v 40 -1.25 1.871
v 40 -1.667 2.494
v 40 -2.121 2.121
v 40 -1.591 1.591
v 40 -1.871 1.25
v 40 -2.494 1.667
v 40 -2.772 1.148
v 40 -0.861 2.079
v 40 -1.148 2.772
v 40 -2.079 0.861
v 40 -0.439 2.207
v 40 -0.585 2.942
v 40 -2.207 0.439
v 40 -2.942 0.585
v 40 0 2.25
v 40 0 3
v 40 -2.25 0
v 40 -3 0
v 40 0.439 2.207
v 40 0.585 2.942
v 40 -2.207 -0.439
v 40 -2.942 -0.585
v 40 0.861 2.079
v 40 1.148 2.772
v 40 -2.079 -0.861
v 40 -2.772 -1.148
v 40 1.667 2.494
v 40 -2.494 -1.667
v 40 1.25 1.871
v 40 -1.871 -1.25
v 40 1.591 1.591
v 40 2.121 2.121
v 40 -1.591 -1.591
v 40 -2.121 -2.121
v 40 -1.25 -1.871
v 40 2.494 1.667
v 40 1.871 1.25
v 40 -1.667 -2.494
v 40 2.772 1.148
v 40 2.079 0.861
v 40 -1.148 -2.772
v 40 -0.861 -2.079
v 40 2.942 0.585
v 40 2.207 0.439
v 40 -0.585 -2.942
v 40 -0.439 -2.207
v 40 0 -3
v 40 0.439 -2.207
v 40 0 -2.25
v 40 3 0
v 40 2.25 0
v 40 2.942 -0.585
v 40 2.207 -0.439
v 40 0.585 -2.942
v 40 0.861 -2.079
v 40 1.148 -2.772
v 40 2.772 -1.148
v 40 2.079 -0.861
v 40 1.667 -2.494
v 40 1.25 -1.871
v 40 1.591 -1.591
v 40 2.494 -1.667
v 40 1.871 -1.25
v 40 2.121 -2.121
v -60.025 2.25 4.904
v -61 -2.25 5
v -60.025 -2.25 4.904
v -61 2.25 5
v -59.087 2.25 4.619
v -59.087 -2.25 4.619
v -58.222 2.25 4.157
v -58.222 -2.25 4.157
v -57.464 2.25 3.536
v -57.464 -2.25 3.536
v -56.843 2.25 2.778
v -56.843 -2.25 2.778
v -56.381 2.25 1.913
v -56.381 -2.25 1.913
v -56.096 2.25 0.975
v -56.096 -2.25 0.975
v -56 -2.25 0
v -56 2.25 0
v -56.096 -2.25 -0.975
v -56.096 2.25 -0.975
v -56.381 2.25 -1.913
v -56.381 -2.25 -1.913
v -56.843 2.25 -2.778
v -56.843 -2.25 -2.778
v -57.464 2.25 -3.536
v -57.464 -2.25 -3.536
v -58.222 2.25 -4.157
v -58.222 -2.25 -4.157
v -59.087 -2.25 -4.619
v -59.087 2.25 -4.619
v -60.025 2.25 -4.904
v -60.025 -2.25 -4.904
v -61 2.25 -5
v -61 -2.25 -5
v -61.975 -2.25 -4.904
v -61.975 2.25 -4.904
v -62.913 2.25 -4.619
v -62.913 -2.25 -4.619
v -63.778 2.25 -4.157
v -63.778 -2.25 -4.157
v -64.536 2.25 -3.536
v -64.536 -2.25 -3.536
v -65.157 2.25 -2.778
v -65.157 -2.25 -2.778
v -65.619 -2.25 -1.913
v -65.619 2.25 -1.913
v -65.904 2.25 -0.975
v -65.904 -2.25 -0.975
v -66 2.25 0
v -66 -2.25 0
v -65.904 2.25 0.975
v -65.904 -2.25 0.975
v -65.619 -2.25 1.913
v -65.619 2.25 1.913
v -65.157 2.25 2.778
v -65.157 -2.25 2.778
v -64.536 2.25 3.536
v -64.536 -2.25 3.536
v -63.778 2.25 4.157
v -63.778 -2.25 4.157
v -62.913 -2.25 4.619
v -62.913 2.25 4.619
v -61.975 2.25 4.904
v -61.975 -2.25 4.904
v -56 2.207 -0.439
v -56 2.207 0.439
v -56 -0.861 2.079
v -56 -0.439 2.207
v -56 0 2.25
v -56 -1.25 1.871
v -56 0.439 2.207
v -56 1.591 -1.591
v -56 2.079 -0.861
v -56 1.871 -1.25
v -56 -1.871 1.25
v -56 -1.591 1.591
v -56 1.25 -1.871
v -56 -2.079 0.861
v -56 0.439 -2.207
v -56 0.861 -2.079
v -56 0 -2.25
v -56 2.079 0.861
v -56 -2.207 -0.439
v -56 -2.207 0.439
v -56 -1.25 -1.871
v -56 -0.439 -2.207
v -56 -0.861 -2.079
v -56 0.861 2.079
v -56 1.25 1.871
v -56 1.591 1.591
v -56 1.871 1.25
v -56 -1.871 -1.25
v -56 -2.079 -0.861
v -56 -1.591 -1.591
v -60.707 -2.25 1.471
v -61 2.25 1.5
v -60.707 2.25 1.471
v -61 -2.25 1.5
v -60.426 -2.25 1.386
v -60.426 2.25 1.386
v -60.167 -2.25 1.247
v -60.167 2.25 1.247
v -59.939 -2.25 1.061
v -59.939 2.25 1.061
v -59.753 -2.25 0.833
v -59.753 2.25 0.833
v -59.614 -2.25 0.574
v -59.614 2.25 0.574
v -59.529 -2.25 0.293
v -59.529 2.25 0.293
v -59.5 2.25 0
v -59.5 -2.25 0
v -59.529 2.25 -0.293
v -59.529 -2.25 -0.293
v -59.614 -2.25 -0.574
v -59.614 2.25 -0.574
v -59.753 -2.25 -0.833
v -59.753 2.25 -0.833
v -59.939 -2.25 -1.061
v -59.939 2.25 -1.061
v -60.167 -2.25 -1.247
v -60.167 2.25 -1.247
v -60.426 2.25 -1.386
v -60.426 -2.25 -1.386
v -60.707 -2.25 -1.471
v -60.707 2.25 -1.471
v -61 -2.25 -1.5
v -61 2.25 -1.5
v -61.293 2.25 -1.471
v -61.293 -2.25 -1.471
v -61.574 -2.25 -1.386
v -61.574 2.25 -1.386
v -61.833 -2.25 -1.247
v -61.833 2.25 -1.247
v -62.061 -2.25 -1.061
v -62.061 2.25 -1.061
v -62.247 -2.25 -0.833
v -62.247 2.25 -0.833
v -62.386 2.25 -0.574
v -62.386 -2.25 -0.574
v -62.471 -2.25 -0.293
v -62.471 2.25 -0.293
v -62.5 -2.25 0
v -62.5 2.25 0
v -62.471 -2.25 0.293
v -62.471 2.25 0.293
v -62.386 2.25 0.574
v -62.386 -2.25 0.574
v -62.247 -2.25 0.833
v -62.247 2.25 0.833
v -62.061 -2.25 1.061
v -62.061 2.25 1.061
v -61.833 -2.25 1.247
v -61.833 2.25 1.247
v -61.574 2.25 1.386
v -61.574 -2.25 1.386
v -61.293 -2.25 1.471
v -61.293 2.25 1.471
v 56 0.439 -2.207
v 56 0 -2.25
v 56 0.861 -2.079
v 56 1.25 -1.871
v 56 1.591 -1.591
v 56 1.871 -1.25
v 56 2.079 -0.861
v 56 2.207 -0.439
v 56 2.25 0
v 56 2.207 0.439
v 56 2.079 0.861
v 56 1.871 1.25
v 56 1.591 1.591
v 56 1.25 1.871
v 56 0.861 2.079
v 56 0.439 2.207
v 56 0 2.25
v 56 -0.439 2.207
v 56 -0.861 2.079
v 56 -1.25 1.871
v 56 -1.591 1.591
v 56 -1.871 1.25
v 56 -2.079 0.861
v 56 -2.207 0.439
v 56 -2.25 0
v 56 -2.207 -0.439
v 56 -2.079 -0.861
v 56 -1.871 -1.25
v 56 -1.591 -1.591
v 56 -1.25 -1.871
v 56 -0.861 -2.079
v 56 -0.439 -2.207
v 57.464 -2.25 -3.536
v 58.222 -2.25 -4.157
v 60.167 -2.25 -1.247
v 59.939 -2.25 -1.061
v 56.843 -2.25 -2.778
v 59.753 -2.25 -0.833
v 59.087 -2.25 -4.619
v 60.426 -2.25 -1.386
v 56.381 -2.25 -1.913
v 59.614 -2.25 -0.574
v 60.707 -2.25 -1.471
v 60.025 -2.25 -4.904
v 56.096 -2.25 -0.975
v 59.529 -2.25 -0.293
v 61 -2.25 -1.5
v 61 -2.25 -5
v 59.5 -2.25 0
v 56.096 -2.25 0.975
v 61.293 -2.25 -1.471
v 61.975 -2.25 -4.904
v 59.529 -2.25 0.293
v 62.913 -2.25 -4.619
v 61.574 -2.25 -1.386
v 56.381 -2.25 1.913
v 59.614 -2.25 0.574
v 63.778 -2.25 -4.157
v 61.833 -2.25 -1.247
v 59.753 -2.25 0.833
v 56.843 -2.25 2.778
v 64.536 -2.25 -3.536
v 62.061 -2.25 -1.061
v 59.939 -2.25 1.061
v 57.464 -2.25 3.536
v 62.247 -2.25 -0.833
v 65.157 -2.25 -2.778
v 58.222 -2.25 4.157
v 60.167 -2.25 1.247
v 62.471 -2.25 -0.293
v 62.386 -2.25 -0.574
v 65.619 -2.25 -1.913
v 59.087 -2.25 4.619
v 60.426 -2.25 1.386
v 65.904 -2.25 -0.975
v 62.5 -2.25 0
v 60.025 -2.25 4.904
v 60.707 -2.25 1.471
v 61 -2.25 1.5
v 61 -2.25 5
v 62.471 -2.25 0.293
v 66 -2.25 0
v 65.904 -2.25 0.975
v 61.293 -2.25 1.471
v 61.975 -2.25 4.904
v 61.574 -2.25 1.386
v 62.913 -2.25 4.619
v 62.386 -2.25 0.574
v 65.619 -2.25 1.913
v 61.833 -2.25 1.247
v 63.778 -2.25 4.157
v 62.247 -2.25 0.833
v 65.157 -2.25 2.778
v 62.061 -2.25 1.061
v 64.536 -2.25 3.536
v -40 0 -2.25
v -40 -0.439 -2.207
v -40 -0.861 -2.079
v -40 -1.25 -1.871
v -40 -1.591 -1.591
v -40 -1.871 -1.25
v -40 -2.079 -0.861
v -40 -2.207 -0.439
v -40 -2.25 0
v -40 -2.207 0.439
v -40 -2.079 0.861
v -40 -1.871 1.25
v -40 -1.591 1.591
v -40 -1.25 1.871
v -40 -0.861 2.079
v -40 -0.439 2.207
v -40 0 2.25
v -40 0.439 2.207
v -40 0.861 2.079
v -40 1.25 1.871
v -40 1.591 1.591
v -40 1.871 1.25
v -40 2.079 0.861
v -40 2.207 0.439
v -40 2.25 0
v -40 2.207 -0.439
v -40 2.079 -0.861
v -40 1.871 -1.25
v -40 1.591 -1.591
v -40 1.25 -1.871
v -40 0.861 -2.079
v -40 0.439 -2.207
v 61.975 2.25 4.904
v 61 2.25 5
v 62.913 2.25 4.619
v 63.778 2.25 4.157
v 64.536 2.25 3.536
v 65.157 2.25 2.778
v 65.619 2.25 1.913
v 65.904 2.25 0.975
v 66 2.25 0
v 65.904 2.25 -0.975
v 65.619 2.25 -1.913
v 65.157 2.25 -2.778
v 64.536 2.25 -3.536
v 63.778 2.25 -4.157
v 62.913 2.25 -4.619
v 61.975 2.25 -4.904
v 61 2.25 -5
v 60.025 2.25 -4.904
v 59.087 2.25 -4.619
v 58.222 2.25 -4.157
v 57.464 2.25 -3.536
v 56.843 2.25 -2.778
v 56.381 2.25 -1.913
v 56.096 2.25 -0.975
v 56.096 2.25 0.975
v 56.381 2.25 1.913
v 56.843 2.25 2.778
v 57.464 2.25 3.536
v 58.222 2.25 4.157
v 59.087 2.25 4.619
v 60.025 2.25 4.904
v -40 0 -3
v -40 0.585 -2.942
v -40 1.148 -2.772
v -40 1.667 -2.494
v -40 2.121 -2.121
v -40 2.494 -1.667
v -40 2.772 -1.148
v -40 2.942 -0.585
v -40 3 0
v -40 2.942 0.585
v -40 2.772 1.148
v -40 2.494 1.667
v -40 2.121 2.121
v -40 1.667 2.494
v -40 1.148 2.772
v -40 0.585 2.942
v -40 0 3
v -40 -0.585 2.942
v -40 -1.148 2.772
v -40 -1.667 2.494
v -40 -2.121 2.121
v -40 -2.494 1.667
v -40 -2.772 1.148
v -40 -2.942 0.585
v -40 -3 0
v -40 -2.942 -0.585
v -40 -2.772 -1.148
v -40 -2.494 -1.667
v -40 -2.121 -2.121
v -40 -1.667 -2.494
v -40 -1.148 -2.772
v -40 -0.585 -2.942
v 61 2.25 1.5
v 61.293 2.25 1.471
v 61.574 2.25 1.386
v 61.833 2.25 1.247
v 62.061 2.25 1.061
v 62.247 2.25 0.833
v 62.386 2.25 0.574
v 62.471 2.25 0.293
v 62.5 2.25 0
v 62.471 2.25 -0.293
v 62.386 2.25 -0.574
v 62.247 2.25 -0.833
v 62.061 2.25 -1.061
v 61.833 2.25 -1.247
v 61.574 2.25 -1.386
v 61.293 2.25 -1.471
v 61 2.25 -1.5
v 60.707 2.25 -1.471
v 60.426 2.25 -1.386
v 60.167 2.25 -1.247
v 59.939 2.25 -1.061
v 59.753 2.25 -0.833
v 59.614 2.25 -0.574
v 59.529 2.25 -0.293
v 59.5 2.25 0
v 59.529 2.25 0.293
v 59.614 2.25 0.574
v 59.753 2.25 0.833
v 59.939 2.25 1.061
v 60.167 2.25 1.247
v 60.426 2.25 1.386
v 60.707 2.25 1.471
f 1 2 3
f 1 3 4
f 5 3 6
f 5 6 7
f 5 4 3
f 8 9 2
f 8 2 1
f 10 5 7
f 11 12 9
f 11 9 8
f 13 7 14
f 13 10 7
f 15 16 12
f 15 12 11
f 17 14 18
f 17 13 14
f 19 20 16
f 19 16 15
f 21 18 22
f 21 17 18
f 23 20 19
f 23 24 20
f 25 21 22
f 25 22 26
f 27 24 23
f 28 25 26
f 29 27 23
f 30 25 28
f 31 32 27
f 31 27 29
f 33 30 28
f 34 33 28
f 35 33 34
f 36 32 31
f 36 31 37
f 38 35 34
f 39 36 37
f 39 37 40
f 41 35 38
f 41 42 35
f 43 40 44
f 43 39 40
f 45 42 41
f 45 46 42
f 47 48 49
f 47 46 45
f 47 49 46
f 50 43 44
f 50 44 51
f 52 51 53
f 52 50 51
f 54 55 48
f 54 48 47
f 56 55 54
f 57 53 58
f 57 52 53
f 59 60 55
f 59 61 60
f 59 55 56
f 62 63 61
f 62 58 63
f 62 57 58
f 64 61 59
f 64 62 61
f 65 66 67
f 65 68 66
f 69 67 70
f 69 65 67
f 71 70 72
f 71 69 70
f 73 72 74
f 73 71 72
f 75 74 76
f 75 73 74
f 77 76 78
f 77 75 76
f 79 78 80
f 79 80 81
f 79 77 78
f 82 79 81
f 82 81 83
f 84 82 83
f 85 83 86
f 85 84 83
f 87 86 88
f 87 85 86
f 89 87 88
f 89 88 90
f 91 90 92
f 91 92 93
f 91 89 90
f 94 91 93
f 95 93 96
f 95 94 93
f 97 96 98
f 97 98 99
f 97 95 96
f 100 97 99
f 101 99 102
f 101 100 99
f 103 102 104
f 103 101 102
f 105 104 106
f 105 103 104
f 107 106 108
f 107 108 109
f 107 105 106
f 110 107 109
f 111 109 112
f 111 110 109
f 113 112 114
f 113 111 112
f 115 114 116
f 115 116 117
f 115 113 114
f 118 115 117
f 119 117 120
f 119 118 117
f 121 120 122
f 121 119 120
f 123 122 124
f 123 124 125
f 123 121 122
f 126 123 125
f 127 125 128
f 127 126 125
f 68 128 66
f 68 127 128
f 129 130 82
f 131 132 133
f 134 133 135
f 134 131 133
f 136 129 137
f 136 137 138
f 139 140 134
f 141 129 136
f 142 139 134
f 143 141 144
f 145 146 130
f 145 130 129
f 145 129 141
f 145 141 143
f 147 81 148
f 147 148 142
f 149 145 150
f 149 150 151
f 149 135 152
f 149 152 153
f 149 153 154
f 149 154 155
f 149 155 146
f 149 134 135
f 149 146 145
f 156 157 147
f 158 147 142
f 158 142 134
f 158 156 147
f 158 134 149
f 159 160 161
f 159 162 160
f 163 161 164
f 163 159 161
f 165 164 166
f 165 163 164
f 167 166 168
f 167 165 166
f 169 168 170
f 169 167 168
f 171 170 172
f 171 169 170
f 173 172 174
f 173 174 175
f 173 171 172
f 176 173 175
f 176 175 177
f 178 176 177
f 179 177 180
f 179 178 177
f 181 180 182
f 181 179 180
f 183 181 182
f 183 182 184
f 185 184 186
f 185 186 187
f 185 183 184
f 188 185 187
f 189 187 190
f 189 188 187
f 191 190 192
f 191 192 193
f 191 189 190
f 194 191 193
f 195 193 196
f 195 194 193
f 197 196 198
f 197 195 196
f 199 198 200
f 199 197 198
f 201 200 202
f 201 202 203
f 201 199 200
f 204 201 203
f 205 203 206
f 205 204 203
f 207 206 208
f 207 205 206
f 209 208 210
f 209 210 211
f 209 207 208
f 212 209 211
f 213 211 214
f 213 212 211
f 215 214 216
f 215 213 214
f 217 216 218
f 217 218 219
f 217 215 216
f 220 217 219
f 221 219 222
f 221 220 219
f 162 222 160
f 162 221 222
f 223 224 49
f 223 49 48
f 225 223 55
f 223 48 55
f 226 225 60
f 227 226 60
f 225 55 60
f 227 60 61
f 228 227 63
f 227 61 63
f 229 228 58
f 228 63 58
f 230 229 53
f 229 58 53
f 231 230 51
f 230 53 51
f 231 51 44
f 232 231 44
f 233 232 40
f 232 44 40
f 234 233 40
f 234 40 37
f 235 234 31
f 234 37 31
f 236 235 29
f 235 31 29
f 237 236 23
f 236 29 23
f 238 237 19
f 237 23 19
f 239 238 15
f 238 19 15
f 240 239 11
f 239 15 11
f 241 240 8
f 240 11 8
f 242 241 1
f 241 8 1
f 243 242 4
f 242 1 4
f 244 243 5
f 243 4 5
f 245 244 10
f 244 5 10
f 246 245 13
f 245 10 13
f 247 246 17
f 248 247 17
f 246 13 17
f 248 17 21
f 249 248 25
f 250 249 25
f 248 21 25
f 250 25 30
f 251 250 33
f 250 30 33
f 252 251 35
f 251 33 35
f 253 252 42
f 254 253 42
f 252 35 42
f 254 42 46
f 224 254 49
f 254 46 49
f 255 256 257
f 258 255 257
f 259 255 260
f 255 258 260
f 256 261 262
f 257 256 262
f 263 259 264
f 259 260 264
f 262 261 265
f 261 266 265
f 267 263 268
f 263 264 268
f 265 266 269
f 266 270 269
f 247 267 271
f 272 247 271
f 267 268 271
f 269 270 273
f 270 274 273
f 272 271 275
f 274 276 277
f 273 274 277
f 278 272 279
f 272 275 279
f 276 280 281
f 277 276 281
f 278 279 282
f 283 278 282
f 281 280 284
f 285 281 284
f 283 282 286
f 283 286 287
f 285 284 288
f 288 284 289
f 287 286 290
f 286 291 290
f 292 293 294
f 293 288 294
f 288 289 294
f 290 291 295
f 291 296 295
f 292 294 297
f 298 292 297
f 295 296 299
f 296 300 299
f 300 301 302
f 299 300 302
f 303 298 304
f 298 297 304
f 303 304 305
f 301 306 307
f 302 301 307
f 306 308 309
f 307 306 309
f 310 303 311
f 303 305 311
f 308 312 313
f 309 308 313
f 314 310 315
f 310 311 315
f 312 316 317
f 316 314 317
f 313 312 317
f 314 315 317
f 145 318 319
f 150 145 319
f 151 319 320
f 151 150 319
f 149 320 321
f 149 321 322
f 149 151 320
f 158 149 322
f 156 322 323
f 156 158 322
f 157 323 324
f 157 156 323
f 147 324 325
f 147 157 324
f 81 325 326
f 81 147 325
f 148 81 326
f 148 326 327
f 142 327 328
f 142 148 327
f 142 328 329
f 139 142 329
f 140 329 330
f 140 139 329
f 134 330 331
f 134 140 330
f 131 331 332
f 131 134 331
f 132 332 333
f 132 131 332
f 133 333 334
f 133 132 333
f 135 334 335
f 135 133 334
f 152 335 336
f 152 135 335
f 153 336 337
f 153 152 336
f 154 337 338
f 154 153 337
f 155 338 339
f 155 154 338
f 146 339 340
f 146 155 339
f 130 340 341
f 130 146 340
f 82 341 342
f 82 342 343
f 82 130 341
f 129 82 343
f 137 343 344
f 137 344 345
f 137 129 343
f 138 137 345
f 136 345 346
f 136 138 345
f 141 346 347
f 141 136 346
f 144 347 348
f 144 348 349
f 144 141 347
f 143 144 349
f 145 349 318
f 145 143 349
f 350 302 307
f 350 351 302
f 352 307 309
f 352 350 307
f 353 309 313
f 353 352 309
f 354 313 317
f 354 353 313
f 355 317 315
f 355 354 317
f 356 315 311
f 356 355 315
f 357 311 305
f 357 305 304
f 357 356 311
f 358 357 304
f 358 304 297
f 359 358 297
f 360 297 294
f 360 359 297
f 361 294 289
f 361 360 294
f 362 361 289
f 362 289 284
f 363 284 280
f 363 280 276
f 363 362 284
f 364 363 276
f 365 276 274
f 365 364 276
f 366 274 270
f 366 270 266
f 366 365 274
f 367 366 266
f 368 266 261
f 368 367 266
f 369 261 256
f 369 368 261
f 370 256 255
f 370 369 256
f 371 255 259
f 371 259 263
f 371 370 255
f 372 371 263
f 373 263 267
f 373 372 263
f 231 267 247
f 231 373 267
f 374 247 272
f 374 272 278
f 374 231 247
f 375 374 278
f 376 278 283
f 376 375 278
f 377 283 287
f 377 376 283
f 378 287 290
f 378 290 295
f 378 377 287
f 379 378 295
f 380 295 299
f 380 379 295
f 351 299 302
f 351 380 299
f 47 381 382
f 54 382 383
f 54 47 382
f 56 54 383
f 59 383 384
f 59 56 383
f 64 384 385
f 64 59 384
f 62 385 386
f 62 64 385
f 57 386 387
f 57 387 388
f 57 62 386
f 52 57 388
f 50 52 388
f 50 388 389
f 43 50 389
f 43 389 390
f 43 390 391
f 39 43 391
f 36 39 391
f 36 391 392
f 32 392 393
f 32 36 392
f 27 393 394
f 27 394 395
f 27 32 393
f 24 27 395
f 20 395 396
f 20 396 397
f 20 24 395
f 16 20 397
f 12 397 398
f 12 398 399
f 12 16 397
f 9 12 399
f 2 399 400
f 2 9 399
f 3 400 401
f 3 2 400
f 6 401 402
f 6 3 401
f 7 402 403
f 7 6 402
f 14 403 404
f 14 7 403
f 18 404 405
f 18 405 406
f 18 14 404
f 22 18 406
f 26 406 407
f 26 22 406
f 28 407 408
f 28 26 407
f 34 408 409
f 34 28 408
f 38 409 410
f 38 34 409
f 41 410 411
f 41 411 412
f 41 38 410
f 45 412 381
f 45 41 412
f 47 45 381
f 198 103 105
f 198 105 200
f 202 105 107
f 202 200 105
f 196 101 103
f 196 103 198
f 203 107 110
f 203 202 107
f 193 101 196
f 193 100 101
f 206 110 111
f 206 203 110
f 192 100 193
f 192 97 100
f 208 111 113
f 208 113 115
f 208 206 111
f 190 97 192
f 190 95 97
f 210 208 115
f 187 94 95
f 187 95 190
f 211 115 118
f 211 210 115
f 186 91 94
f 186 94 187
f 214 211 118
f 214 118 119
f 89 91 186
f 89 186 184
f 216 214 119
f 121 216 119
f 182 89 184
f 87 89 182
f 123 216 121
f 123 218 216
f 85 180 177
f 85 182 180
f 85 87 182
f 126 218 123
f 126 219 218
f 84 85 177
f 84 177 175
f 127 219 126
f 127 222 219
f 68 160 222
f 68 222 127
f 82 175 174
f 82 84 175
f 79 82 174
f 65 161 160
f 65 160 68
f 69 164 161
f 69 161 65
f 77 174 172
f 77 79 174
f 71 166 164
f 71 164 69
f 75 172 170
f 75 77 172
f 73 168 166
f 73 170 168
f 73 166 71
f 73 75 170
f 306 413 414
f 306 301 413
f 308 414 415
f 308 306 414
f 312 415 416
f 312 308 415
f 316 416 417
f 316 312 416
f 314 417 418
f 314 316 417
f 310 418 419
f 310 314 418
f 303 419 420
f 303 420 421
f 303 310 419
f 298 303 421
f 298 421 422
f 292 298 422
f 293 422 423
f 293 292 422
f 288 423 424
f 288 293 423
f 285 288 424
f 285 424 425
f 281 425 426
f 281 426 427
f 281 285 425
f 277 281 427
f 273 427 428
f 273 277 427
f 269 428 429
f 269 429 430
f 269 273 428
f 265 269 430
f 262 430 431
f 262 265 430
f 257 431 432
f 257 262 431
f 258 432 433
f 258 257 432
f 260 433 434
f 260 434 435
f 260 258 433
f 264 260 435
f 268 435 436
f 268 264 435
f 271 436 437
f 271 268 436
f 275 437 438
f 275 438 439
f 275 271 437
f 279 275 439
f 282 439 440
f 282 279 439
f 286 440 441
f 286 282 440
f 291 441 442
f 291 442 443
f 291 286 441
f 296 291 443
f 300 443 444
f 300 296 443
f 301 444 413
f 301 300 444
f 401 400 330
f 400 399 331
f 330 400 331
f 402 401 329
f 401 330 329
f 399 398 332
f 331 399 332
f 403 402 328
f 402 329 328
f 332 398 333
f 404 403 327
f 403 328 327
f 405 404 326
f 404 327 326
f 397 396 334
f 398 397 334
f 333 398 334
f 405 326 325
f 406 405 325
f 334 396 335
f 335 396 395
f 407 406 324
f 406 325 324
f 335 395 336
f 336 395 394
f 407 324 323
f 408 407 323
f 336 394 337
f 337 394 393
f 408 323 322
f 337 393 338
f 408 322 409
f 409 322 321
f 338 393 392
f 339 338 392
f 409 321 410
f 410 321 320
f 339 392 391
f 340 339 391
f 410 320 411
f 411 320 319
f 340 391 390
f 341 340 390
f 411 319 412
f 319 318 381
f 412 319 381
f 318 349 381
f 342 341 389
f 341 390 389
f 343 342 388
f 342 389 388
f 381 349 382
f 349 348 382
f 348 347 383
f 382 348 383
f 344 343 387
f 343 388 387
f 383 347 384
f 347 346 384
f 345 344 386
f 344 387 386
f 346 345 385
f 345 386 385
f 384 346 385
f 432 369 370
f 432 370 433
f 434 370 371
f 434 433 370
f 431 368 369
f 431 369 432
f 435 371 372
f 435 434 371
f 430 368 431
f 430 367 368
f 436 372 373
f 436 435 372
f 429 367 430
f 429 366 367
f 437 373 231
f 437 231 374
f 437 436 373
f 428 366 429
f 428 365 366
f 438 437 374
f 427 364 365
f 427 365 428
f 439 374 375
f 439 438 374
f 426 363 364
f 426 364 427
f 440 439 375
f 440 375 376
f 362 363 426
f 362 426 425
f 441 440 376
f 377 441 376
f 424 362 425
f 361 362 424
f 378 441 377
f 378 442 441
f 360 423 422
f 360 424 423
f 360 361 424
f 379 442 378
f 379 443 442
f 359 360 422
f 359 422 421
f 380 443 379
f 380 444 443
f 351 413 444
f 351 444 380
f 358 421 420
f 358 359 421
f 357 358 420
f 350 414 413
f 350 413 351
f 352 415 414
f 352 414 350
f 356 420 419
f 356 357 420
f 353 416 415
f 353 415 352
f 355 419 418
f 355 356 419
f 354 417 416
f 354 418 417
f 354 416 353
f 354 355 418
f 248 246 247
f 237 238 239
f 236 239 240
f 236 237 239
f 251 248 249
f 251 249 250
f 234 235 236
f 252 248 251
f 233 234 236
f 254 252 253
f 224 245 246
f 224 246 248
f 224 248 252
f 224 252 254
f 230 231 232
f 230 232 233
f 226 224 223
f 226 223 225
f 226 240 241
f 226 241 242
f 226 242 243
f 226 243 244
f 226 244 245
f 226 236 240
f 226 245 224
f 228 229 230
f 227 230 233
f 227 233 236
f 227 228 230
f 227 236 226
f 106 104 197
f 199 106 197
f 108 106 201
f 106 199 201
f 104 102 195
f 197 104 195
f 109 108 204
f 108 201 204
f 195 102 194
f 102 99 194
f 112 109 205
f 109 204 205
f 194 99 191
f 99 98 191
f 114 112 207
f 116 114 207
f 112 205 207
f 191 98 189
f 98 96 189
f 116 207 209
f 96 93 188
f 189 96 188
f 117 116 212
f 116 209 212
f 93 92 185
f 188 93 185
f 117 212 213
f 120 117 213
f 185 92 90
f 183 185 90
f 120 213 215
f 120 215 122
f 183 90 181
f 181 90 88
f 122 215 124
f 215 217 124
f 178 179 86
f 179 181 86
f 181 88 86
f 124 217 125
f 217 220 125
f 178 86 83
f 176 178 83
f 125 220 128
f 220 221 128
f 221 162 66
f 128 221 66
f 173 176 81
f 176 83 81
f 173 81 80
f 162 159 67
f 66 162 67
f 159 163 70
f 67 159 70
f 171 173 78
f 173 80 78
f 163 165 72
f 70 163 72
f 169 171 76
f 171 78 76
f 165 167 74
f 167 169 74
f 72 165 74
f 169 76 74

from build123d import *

# Parameters (mm, degrees)
SKETCH1_R             = 3
BOSS_EXTRUDE1_DEPTH   = 40
SKETCH2_R             = 2.25
BOSS_EXTRUDE2_DEPTH   = 16
BOSS_EXTRUDE4_START   = 16
SKETCH4_R             = 2.25
BOSS_EXTRUDE4_DEPTH   = 16
SKETCH3_R             = 5
SKETCH3_R_2           = 1.5
BOSS_EXTRUDE3_DEPTH   = 2.25
BOSS_EXTRUDE3_2_DEPTH = 2.25


with BuildPart() as part:
    # Sketch1 → Boss-Extrude1 (new, symmetric)
    with BuildSketch(Plane(origin=(0, 0, 0), x_dir=(0, 0, -1), z_dir=(1, 0, 0))):
        Circle(SKETCH1_R)
    extrude(amount=BOSS_EXTRUDE1_DEPTH, both=True)

    # Sketch2 → Boss-Extrude2 (add)
    with BuildSketch(Plane(origin=(40, 0, 0), x_dir=(0, 0, -1), z_dir=(1, 0, 0))):
        Circle(SKETCH2_R)
    extrude(amount=BOSS_EXTRUDE2_DEPTH)

    # Sketch4 → Boss-Extrude4 (add)
    with BuildSketch(Plane.ZY.offset(40).offset(BOSS_EXTRUDE4_START)):
        with Locations(Location((0, 0, 0), (0, 0, 180))):
            Circle(SKETCH4_R)
    extrude(amount=-BOSS_EXTRUDE4_DEPTH)


with BuildPart() as body_2:
    # Sketch3 → Boss-Extrude3 (new, symmetric)
    with BuildSketch(Plane(origin=(0, 0, 0), x_dir=(1, 0, 0), z_dir=(0, 1, 0))):
        with Locations(Location((61, 0, 0), (0, 0, 270))):
            Circle(SKETCH3_R)
        with Locations(Location((61, 0, 0), (0, 0, 270))):
            Circle(SKETCH3_R_2, mode=Mode.SUBTRACT)
    extrude(amount=BOSS_EXTRUDE3_DEPTH, both=True)


with BuildPart() as body_3:
    # Sketch3 → Boss-Extrude3 2 (new, symmetric)
    with BuildSketch(Plane(origin=(0, 0, 0), x_dir=(1, 0, 0), z_dir=(0, 1, 0))):
        with Locations(Location((-61, 0, 0), (0, 0, 270))):
            Circle(SKETCH3_R)
        with Locations(Location((-61, 0, 0), (0, 0, 270))):
            Circle(SKETCH3_R_2, mode=Mode.SUBTRACT)
    extrude(amount=BOSS_EXTRUDE3_2_DEPTH, both=True)


solid = Compound([part.part, body_2.part, body_3.part])
